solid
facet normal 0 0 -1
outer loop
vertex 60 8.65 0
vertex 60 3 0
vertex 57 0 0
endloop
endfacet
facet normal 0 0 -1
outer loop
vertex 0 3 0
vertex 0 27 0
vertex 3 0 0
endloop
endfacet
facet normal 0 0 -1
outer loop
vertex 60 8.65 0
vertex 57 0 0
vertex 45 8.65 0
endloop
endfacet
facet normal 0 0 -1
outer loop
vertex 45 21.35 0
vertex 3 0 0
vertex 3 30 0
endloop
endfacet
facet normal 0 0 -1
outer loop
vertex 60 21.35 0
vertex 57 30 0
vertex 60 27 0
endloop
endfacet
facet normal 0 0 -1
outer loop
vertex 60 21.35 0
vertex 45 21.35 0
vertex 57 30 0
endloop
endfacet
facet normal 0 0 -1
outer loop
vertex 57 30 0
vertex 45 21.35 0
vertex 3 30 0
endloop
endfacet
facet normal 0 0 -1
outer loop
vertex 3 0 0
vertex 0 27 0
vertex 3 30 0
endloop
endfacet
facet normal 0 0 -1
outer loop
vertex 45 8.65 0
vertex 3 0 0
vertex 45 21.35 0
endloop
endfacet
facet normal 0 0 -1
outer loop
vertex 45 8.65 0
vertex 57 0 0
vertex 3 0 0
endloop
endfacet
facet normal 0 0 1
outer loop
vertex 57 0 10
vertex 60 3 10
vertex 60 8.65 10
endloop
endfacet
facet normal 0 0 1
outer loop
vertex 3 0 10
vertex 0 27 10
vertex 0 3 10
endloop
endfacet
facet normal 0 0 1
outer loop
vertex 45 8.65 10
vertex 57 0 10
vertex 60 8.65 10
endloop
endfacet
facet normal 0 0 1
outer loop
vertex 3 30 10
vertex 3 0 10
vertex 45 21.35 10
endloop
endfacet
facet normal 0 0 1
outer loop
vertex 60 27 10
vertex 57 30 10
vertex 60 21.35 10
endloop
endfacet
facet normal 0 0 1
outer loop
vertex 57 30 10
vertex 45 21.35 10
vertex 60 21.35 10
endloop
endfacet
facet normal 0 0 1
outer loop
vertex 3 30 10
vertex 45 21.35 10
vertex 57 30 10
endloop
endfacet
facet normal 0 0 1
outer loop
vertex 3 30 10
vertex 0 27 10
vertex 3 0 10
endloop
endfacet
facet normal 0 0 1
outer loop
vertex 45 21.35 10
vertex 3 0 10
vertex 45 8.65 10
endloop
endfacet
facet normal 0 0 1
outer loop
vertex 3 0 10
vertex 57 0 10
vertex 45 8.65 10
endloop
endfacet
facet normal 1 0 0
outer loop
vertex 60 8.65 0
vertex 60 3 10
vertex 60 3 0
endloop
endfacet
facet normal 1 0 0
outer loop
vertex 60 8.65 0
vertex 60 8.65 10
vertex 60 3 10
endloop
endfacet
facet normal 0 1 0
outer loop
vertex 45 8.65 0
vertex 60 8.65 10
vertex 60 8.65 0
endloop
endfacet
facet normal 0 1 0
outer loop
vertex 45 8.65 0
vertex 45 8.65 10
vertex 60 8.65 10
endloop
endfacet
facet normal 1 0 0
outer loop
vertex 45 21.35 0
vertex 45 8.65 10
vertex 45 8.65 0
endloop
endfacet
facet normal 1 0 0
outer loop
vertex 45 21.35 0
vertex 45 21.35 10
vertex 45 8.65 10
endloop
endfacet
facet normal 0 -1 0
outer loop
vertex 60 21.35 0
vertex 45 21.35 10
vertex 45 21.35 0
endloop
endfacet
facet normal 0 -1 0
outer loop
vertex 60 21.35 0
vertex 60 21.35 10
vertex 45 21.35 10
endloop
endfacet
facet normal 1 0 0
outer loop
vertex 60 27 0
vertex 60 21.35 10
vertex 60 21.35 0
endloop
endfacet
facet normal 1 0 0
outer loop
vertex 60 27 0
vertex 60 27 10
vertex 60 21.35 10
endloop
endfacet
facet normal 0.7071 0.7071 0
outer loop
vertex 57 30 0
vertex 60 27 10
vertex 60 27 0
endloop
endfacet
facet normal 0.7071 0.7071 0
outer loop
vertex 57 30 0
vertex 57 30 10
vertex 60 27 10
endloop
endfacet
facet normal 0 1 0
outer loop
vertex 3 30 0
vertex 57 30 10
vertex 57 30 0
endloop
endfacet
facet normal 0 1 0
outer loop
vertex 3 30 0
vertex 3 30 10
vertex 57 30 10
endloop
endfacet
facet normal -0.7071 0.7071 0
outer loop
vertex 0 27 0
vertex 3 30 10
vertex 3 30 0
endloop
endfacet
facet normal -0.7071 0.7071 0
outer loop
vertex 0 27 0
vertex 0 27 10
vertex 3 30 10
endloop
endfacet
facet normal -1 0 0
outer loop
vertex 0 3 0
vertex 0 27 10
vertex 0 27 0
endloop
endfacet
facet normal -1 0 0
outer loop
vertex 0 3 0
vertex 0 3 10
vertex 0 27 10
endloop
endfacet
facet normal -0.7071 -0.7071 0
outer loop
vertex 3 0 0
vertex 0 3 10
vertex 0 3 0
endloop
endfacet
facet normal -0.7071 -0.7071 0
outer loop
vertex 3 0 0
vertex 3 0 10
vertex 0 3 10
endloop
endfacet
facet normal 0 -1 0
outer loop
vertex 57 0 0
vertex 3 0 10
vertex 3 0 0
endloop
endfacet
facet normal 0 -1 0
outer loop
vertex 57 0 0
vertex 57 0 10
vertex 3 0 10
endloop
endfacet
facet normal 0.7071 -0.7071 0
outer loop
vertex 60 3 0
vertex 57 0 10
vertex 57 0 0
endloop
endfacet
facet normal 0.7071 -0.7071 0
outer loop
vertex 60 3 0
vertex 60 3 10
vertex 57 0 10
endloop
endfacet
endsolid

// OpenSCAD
$fn = 32;

// ----------------------------------------------------------------------
// C washer: 60 x 30 mm plate with an open slot
// ----------------------------------------------------------------------

// --- parameters (mm) ---
profile_height = 10;      // extrusion height
profile_points = 12;      // points of the closed outline

profile = [[3, 0], [57, 0], [60, 3], [60, 8.65], [45, 8.65], [45, 21.35], [60, 21.35], [60, 27], [57, 30], [3, 30], [0, 27], [0, 3]];  // single closed polygon, 12 points, counter clockwise

// --- the one profile operation ---
linear_extrude(height = profile_height) polygon(points = profile);
